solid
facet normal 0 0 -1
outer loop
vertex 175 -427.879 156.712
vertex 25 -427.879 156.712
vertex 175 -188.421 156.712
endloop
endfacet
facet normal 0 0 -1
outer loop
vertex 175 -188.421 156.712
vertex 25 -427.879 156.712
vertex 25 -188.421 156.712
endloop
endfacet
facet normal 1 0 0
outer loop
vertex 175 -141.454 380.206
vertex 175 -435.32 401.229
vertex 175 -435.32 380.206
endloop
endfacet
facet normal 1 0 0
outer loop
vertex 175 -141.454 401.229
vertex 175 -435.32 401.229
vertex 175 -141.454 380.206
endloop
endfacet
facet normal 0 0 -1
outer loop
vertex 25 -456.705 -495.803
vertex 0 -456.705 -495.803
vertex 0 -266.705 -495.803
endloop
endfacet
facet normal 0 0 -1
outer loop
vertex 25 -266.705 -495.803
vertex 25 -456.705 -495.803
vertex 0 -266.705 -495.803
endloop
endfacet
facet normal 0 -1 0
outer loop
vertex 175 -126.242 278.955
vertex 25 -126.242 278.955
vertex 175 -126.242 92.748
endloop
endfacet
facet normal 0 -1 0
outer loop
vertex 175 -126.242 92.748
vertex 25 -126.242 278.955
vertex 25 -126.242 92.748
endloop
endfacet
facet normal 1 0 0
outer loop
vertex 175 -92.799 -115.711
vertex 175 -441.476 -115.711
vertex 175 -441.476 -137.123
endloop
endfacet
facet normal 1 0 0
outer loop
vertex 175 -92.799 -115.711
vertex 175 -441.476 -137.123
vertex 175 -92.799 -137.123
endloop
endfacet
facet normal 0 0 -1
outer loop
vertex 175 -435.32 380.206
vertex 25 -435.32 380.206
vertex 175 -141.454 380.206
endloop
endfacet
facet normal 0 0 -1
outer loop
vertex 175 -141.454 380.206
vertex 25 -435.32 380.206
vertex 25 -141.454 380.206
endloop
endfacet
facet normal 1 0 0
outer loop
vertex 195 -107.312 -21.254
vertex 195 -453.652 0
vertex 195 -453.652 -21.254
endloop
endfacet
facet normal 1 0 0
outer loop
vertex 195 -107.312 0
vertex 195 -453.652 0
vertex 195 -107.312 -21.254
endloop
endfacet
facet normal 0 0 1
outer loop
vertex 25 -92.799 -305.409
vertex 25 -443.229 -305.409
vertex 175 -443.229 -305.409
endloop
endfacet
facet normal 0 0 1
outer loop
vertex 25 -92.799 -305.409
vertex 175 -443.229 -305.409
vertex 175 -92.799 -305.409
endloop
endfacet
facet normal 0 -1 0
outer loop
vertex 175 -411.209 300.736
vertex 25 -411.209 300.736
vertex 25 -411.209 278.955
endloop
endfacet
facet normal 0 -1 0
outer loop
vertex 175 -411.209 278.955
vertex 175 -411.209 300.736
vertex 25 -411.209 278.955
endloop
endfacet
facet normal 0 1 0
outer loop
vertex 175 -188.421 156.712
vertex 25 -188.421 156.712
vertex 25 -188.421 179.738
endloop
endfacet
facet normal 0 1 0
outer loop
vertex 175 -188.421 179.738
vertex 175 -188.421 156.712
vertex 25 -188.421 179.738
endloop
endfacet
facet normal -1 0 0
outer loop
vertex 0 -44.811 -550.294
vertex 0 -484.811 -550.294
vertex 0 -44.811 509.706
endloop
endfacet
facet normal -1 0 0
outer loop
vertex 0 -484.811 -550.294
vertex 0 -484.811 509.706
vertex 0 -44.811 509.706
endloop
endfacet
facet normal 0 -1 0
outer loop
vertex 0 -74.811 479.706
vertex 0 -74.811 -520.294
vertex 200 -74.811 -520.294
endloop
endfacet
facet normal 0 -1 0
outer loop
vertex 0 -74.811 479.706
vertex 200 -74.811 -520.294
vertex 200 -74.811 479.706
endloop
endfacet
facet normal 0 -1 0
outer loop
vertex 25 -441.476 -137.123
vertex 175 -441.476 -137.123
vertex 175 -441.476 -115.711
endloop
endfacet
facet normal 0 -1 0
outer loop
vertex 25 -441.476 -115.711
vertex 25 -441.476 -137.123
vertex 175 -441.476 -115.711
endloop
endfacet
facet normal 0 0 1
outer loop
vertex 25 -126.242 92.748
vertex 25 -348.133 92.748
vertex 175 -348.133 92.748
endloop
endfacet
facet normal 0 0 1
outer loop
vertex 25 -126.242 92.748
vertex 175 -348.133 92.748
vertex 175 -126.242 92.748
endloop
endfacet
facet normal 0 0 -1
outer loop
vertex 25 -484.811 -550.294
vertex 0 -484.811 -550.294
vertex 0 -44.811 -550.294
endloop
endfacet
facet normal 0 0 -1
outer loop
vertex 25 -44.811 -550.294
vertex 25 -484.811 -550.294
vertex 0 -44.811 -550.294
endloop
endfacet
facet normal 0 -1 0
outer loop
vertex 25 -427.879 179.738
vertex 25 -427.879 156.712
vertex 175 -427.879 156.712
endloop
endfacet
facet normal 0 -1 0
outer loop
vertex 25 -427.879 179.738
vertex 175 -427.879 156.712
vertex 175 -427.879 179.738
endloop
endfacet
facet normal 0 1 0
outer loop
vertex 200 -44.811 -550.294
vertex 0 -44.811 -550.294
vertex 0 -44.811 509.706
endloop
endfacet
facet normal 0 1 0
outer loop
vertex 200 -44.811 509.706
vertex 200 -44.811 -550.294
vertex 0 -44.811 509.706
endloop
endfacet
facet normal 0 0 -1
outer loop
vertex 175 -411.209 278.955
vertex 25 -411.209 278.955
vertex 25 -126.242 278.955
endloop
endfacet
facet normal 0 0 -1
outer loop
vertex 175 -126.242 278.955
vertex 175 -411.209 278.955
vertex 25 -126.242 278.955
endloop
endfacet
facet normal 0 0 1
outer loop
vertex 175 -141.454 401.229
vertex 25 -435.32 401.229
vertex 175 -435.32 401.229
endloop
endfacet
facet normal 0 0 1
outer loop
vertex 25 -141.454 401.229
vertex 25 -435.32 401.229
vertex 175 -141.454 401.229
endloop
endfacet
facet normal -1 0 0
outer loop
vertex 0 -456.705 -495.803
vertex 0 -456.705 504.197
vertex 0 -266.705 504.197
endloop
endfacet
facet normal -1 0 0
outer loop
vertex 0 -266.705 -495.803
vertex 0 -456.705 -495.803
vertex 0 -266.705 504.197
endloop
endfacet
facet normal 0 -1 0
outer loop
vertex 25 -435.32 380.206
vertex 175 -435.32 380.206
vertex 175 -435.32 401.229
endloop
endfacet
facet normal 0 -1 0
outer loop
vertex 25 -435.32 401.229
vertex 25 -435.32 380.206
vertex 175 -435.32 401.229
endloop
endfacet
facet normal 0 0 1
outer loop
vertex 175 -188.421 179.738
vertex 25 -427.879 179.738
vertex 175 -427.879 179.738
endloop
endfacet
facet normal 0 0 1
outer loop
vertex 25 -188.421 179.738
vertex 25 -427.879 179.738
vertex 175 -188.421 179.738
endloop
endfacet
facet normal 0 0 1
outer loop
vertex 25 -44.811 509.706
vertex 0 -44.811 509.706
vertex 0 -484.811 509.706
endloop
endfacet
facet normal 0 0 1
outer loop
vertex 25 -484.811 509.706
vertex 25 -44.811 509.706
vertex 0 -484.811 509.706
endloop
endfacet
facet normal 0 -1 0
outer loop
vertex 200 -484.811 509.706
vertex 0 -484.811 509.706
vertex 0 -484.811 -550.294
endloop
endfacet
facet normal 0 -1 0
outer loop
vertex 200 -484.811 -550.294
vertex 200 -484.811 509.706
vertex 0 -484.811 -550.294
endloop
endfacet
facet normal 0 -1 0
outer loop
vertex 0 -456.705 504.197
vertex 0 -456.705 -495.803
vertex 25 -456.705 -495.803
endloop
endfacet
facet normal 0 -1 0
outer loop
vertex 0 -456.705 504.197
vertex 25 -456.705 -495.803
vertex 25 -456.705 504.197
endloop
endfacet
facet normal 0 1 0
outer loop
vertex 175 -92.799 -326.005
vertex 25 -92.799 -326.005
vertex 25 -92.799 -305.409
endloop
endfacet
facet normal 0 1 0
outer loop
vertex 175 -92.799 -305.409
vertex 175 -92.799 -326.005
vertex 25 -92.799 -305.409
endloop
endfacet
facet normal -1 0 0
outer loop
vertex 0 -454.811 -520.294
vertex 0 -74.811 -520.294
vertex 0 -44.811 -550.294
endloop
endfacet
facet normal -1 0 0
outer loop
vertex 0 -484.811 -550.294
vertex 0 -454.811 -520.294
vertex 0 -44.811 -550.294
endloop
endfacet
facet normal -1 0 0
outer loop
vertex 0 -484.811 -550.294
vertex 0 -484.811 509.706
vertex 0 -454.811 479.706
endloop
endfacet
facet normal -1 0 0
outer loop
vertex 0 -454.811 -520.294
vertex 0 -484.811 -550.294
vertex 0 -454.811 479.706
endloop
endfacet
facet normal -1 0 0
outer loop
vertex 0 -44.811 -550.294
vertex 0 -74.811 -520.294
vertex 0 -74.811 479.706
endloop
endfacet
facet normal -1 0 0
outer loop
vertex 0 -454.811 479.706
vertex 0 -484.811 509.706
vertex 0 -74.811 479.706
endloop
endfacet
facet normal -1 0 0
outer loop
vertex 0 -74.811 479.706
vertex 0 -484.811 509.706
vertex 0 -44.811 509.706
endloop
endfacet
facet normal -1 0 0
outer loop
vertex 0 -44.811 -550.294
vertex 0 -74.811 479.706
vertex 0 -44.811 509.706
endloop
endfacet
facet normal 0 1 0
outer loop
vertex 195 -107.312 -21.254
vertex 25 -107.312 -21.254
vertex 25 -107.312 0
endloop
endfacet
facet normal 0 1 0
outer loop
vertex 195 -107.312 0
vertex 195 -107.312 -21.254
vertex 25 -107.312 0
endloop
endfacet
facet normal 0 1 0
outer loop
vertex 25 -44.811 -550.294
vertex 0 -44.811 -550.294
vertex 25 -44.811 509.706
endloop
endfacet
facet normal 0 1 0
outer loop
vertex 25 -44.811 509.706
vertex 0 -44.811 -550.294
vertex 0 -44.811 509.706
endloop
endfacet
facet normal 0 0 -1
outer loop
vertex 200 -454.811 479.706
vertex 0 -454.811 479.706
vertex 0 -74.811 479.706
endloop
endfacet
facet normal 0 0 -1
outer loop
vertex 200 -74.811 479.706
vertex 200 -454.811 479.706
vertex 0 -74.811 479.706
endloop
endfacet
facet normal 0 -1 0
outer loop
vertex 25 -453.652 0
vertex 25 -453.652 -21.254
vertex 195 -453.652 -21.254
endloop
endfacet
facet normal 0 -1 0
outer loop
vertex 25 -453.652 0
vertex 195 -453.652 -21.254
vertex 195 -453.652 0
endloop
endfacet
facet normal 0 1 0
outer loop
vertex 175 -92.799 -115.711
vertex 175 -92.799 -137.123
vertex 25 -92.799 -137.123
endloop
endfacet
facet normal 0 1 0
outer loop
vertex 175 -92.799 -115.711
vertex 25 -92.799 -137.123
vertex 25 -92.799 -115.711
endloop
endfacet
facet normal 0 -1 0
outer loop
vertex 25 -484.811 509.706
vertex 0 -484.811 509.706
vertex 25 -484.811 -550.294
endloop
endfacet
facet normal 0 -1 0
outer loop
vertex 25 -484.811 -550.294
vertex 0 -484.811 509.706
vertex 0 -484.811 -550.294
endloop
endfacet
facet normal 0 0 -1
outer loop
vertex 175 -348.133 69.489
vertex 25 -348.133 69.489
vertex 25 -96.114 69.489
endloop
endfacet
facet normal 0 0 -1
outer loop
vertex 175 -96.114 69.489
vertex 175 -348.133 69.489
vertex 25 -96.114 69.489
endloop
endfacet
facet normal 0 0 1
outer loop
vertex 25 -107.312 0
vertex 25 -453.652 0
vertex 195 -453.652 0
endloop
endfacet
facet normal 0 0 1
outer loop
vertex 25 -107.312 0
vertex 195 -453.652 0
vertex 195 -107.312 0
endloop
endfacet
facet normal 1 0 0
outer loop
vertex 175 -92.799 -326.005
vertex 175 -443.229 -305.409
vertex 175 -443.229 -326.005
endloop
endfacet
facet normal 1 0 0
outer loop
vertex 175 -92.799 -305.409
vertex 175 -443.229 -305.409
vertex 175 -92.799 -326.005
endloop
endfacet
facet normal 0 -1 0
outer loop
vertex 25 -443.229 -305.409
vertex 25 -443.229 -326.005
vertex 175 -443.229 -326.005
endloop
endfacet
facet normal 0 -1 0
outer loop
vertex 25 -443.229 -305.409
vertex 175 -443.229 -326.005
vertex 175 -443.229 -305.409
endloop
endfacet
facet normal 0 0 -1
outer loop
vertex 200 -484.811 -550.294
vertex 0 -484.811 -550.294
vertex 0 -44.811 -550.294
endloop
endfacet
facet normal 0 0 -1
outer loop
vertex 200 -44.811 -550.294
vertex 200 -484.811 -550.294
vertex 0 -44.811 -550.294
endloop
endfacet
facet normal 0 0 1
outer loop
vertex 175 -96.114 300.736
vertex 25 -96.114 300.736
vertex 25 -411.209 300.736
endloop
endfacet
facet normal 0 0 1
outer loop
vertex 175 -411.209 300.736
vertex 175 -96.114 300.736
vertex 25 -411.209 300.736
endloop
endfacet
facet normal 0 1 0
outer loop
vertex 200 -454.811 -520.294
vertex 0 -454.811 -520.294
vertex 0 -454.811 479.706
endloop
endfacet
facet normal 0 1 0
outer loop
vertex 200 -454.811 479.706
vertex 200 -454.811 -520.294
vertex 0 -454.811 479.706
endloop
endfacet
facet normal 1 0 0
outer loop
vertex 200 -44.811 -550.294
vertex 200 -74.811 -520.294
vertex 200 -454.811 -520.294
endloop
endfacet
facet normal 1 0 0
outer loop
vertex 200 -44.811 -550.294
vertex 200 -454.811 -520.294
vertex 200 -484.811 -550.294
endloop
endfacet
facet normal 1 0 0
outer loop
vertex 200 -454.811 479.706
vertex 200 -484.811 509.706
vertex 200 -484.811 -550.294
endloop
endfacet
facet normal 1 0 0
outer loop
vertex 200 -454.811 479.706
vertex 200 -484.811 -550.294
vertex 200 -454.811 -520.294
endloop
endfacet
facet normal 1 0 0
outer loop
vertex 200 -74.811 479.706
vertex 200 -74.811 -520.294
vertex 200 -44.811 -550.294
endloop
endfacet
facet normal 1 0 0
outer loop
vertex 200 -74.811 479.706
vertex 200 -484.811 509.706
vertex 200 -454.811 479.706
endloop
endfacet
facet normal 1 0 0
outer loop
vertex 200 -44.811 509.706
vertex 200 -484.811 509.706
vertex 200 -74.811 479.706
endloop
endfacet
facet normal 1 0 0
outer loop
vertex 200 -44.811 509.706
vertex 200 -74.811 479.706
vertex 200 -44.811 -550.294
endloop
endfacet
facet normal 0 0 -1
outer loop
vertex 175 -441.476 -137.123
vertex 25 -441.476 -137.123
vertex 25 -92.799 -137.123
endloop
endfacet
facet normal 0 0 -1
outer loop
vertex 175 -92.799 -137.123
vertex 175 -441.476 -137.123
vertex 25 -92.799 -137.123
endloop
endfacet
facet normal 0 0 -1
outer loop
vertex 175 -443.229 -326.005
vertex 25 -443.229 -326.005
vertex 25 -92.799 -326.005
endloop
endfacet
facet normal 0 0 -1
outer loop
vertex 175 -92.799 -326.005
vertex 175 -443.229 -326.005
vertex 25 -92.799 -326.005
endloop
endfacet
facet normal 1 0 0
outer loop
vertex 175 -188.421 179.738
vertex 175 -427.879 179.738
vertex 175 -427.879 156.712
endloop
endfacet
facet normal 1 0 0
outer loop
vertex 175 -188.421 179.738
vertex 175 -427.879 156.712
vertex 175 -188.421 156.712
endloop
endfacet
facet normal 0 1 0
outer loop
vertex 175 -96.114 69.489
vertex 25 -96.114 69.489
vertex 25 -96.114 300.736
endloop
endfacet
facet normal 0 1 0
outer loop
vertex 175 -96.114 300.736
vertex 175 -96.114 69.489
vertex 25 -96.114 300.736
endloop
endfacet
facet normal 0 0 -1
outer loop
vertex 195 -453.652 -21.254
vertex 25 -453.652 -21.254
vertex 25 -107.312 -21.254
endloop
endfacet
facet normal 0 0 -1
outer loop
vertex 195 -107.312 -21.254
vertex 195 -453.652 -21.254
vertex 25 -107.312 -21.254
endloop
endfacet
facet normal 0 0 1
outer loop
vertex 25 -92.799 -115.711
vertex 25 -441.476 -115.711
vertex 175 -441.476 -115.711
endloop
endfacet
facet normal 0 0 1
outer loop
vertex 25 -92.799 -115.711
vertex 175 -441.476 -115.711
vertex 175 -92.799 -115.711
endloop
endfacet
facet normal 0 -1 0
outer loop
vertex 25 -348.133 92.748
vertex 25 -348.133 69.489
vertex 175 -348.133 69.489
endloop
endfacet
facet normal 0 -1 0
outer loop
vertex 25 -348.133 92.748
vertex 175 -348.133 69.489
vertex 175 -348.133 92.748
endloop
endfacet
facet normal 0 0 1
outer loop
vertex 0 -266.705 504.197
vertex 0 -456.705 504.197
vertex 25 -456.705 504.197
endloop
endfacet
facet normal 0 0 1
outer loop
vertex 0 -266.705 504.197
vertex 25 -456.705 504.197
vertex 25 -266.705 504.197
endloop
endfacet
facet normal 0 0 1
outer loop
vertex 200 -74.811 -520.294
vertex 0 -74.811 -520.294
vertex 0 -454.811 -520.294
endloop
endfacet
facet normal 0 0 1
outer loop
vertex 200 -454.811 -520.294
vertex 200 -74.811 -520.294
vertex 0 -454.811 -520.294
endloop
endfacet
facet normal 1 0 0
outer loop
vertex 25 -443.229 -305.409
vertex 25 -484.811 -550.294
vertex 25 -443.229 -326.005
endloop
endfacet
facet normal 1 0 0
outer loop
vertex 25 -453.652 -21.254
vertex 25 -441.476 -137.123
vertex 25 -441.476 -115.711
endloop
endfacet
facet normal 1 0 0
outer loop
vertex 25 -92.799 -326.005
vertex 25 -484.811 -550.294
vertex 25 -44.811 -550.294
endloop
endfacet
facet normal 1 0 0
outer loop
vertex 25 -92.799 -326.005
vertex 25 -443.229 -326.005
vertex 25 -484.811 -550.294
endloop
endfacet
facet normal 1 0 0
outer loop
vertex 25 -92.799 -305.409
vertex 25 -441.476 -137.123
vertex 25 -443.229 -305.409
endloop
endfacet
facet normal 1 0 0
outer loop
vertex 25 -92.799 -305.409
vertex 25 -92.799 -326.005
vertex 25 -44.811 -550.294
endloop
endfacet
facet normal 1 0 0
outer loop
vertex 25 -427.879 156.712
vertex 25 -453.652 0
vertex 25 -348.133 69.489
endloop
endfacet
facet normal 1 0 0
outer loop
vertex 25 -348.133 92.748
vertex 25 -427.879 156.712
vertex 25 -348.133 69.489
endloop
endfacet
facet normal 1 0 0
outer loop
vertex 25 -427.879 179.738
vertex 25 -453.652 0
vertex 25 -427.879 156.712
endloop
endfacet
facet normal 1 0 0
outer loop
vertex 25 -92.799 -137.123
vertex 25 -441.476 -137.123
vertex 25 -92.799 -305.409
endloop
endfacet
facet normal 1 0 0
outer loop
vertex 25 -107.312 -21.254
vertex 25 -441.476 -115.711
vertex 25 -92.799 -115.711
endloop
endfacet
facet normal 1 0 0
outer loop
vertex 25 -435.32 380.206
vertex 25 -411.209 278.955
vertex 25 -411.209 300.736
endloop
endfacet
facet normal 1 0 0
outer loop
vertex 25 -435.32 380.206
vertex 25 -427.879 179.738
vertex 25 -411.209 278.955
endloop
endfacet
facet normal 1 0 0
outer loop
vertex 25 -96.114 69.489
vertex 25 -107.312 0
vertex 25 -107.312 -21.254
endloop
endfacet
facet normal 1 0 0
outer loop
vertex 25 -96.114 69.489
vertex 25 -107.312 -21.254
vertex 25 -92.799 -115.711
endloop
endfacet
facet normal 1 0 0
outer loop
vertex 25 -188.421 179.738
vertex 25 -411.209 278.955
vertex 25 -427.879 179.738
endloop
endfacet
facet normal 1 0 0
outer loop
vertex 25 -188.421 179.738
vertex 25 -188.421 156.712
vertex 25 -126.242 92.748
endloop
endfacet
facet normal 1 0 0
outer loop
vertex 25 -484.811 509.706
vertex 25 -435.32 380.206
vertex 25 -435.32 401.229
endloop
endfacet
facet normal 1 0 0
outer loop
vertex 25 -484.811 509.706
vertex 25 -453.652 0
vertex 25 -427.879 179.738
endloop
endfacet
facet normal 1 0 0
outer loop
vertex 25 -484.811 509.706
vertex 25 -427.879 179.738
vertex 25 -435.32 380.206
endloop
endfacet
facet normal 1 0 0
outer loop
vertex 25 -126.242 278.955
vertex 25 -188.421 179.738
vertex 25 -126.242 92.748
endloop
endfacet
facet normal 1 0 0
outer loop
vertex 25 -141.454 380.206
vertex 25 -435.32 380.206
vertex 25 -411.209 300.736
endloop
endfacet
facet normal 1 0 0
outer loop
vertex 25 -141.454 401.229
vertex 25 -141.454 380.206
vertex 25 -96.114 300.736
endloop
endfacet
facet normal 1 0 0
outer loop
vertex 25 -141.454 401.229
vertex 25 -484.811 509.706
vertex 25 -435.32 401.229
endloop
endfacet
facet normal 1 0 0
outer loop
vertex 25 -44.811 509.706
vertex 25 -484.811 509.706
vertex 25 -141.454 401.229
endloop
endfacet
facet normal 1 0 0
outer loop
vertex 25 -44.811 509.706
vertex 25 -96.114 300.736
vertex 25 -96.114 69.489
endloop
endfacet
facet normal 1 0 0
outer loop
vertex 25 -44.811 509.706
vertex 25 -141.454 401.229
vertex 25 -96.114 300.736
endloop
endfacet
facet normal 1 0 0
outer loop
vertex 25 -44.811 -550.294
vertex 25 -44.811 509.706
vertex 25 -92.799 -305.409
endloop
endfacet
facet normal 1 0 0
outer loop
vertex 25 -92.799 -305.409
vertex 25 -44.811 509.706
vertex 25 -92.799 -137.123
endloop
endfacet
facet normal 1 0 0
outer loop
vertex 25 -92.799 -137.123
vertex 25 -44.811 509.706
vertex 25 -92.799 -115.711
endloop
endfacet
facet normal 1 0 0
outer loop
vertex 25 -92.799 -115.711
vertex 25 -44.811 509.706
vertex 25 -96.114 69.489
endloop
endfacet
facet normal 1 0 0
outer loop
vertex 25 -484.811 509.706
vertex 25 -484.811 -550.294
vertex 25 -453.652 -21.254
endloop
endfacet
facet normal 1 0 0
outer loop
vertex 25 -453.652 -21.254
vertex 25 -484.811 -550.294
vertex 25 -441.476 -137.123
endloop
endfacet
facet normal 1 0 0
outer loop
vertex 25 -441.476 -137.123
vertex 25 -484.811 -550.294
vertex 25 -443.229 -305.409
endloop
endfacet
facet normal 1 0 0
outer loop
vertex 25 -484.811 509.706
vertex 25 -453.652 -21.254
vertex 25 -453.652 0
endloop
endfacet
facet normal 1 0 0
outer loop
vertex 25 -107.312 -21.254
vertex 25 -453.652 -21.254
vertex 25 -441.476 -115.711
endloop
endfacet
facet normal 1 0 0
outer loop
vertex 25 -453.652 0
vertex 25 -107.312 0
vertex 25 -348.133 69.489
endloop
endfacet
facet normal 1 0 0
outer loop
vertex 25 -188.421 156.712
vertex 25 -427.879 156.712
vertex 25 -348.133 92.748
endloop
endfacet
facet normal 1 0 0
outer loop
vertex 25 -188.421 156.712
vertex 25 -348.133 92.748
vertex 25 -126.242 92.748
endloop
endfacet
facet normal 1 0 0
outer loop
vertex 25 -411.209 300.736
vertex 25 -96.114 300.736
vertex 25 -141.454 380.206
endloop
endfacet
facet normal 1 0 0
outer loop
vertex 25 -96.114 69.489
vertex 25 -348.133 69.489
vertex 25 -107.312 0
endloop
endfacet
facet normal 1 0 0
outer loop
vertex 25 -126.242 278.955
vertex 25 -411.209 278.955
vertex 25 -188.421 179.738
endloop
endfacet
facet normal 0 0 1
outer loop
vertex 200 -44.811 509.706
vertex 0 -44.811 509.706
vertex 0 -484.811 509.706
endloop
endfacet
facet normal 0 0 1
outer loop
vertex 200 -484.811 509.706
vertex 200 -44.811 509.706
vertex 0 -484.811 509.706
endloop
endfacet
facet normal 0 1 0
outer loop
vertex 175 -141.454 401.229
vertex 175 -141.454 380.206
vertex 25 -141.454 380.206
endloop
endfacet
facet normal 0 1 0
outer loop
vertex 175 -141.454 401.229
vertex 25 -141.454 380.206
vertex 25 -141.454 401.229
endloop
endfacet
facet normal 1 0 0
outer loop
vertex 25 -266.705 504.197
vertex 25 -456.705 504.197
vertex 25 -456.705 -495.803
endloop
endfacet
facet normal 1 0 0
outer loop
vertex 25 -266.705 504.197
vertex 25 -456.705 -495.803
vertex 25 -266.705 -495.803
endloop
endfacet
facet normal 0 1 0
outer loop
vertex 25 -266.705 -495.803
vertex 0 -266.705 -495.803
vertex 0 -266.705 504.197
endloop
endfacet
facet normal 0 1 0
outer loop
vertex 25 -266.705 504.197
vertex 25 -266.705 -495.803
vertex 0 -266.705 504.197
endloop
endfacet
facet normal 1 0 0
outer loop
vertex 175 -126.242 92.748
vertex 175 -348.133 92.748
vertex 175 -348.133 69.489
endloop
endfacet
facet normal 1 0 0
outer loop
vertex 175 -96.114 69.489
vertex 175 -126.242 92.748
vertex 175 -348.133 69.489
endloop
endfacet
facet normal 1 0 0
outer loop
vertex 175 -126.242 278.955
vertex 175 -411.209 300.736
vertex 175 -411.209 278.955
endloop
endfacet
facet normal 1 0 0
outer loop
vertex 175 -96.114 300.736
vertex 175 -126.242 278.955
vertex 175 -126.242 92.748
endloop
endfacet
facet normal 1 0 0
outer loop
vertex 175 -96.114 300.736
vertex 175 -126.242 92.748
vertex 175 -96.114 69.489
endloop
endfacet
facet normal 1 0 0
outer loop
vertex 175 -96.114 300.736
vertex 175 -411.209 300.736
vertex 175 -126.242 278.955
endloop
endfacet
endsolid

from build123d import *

# Parameters (mm, degrees)
F0_W     = 30
F0_H     = 1000
F1_DEPTH = 200
F0_W_2   = 380
F2_DEPTH = 25
F3_W     = 190
F3_H     = 1000
F4_DEPTH = 25
F5_W     = 293.8662618399
F5_H     = 21.023362875
F5_W_2   = 239.4576072693
F5_H_2   = 23.0258256197
F5_W_3   = 221.8910455704
F5_H_3   = 23.259088397
F5_W_4   = 348.6767783761
F5_H_4   = 21.4122384787
F5_W_5   = 350.4301086068
F5_H_5   = 20.5964148045
F6_DEPTH = 150
F7_W     = 346.3403731585
F7_H     = 21.2543550879
F8_DEPTH = 170


with BuildPart() as f1:
    # F0 (on Right) → F1 (new body)
    with BuildSketch(Plane.YZ):
        with Locations((-469.8110079765, -20.2939224243)):
            Rectangle(F0_W, F0_H)
        with Locations((-59.8110079765, -20.2939224243)):
            Rectangle(F0_W, F0_H)
        Polygon((-484.8110079765, 479.7060775757), (-454.8110079765, 479.7060775757), (-74.8110079765, 479.7060775757), (-44.8110079765, 479.7060775757), (-44.8110079765, 509.7060775757), (-484.8110079765, 509.7060775757), align=None)
        Polygon((-74.8110079765, -520.2939224243), (-454.8110079765, -520.2939224243), (-484.8110079765, -520.2939224243), (-484.8110079765, -550.2939224243), (-44.8110079765, -550.2939224243), (-44.8110079765, -520.2939224243), align=None)
    extrude(amount=F1_DEPTH)


with BuildPart() as f2:
    # F0 (on Right) → F2 (new body)
    with BuildSketch(Plane.YZ):
        with Locations((-59.8110079765, -20.2939224243)):
            Rectangle(F0_W, F0_H)
        Polygon((-484.8110079765, 479.7060775757), (-454.8110079765, 479.7060775757), (-74.8110079765, 479.7060775757), (-44.8110079765, 479.7060775757), (-44.8110079765, 509.7060775757), (-484.8110079765, 509.7060775757), align=None)
        Polygon((-74.8110079765, -520.2939224243), (-454.8110079765, -520.2939224243), (-484.8110079765, -520.2939224243), (-484.8110079765, -550.2939224243), (-44.8110079765, -550.2939224243), (-44.8110079765, -520.2939224243), align=None)
        with Locations((-469.8110079765, -20.2939224243)):
            Rectangle(F0_W, F0_H)
        with Locations((-264.8110079765, -20.2939224243)):
            Rectangle(F0_W_2, F0_H)
    extrude(amount=F2_DEPTH)

    # F5 (on face) → F6 (join)
    with BuildSketch(Plane.YZ.offset(25)):
        with Locations((-288.387157023, 390.7174617052)):
            Rectangle(F5_W, F5_H)
        Polygon((-96.1137637496, 300.7355630398), (-411.2088084221, 300.7355630398), (-411.2088084221, 278.9554297924), (-126.2423992157, 278.9554297924), (-96.1137637496, 278.9554297924), align=None)
        with Locations((-308.1502616405, 168.2250127196)):
            Rectangle(F5_W_2, F5_H_2)
        with Locations((-237.1879220009, 81.1184197664)):
            Rectangle(F5_W_3, F5_H_3)
        Polygon((-96.1137637496, 69.4888755679), (-96.1137637496, 278.9554297924), (-126.2423992157, 278.9554297924), (-126.2423992157, 92.7479639649), (-126.2423992157, 69.4888755679), align=None)
        with Locations((-267.1375088394, -126.4171227813)):
            Rectangle(F5_W_4, F5_H_4)
        with Locations((-268.0141739547, -315.7069832087)):
            Rectangle(F5_W_5, F5_H_5)
    extrude(amount=F6_DEPTH)

    # F7 (on face) → F8 (join)
    with BuildSketch(Plane.YZ.offset(25)):
        with Locations((-280.4818376899, -10.6271775439)):
            Rectangle(F7_W, F7_H)
    extrude(amount=F8_DEPTH)


with BuildPart() as f4:
    # F3 (on Right) → F4 (new body)
    with BuildSketch(Plane.YZ):
        with Locations((-361.7053023411, 4.1974354535)):
            Rectangle(F3_W, F3_H)
    extrude(amount=F4_DEPTH)


solid = Compound([f1.part, f2.part, f4.part])
